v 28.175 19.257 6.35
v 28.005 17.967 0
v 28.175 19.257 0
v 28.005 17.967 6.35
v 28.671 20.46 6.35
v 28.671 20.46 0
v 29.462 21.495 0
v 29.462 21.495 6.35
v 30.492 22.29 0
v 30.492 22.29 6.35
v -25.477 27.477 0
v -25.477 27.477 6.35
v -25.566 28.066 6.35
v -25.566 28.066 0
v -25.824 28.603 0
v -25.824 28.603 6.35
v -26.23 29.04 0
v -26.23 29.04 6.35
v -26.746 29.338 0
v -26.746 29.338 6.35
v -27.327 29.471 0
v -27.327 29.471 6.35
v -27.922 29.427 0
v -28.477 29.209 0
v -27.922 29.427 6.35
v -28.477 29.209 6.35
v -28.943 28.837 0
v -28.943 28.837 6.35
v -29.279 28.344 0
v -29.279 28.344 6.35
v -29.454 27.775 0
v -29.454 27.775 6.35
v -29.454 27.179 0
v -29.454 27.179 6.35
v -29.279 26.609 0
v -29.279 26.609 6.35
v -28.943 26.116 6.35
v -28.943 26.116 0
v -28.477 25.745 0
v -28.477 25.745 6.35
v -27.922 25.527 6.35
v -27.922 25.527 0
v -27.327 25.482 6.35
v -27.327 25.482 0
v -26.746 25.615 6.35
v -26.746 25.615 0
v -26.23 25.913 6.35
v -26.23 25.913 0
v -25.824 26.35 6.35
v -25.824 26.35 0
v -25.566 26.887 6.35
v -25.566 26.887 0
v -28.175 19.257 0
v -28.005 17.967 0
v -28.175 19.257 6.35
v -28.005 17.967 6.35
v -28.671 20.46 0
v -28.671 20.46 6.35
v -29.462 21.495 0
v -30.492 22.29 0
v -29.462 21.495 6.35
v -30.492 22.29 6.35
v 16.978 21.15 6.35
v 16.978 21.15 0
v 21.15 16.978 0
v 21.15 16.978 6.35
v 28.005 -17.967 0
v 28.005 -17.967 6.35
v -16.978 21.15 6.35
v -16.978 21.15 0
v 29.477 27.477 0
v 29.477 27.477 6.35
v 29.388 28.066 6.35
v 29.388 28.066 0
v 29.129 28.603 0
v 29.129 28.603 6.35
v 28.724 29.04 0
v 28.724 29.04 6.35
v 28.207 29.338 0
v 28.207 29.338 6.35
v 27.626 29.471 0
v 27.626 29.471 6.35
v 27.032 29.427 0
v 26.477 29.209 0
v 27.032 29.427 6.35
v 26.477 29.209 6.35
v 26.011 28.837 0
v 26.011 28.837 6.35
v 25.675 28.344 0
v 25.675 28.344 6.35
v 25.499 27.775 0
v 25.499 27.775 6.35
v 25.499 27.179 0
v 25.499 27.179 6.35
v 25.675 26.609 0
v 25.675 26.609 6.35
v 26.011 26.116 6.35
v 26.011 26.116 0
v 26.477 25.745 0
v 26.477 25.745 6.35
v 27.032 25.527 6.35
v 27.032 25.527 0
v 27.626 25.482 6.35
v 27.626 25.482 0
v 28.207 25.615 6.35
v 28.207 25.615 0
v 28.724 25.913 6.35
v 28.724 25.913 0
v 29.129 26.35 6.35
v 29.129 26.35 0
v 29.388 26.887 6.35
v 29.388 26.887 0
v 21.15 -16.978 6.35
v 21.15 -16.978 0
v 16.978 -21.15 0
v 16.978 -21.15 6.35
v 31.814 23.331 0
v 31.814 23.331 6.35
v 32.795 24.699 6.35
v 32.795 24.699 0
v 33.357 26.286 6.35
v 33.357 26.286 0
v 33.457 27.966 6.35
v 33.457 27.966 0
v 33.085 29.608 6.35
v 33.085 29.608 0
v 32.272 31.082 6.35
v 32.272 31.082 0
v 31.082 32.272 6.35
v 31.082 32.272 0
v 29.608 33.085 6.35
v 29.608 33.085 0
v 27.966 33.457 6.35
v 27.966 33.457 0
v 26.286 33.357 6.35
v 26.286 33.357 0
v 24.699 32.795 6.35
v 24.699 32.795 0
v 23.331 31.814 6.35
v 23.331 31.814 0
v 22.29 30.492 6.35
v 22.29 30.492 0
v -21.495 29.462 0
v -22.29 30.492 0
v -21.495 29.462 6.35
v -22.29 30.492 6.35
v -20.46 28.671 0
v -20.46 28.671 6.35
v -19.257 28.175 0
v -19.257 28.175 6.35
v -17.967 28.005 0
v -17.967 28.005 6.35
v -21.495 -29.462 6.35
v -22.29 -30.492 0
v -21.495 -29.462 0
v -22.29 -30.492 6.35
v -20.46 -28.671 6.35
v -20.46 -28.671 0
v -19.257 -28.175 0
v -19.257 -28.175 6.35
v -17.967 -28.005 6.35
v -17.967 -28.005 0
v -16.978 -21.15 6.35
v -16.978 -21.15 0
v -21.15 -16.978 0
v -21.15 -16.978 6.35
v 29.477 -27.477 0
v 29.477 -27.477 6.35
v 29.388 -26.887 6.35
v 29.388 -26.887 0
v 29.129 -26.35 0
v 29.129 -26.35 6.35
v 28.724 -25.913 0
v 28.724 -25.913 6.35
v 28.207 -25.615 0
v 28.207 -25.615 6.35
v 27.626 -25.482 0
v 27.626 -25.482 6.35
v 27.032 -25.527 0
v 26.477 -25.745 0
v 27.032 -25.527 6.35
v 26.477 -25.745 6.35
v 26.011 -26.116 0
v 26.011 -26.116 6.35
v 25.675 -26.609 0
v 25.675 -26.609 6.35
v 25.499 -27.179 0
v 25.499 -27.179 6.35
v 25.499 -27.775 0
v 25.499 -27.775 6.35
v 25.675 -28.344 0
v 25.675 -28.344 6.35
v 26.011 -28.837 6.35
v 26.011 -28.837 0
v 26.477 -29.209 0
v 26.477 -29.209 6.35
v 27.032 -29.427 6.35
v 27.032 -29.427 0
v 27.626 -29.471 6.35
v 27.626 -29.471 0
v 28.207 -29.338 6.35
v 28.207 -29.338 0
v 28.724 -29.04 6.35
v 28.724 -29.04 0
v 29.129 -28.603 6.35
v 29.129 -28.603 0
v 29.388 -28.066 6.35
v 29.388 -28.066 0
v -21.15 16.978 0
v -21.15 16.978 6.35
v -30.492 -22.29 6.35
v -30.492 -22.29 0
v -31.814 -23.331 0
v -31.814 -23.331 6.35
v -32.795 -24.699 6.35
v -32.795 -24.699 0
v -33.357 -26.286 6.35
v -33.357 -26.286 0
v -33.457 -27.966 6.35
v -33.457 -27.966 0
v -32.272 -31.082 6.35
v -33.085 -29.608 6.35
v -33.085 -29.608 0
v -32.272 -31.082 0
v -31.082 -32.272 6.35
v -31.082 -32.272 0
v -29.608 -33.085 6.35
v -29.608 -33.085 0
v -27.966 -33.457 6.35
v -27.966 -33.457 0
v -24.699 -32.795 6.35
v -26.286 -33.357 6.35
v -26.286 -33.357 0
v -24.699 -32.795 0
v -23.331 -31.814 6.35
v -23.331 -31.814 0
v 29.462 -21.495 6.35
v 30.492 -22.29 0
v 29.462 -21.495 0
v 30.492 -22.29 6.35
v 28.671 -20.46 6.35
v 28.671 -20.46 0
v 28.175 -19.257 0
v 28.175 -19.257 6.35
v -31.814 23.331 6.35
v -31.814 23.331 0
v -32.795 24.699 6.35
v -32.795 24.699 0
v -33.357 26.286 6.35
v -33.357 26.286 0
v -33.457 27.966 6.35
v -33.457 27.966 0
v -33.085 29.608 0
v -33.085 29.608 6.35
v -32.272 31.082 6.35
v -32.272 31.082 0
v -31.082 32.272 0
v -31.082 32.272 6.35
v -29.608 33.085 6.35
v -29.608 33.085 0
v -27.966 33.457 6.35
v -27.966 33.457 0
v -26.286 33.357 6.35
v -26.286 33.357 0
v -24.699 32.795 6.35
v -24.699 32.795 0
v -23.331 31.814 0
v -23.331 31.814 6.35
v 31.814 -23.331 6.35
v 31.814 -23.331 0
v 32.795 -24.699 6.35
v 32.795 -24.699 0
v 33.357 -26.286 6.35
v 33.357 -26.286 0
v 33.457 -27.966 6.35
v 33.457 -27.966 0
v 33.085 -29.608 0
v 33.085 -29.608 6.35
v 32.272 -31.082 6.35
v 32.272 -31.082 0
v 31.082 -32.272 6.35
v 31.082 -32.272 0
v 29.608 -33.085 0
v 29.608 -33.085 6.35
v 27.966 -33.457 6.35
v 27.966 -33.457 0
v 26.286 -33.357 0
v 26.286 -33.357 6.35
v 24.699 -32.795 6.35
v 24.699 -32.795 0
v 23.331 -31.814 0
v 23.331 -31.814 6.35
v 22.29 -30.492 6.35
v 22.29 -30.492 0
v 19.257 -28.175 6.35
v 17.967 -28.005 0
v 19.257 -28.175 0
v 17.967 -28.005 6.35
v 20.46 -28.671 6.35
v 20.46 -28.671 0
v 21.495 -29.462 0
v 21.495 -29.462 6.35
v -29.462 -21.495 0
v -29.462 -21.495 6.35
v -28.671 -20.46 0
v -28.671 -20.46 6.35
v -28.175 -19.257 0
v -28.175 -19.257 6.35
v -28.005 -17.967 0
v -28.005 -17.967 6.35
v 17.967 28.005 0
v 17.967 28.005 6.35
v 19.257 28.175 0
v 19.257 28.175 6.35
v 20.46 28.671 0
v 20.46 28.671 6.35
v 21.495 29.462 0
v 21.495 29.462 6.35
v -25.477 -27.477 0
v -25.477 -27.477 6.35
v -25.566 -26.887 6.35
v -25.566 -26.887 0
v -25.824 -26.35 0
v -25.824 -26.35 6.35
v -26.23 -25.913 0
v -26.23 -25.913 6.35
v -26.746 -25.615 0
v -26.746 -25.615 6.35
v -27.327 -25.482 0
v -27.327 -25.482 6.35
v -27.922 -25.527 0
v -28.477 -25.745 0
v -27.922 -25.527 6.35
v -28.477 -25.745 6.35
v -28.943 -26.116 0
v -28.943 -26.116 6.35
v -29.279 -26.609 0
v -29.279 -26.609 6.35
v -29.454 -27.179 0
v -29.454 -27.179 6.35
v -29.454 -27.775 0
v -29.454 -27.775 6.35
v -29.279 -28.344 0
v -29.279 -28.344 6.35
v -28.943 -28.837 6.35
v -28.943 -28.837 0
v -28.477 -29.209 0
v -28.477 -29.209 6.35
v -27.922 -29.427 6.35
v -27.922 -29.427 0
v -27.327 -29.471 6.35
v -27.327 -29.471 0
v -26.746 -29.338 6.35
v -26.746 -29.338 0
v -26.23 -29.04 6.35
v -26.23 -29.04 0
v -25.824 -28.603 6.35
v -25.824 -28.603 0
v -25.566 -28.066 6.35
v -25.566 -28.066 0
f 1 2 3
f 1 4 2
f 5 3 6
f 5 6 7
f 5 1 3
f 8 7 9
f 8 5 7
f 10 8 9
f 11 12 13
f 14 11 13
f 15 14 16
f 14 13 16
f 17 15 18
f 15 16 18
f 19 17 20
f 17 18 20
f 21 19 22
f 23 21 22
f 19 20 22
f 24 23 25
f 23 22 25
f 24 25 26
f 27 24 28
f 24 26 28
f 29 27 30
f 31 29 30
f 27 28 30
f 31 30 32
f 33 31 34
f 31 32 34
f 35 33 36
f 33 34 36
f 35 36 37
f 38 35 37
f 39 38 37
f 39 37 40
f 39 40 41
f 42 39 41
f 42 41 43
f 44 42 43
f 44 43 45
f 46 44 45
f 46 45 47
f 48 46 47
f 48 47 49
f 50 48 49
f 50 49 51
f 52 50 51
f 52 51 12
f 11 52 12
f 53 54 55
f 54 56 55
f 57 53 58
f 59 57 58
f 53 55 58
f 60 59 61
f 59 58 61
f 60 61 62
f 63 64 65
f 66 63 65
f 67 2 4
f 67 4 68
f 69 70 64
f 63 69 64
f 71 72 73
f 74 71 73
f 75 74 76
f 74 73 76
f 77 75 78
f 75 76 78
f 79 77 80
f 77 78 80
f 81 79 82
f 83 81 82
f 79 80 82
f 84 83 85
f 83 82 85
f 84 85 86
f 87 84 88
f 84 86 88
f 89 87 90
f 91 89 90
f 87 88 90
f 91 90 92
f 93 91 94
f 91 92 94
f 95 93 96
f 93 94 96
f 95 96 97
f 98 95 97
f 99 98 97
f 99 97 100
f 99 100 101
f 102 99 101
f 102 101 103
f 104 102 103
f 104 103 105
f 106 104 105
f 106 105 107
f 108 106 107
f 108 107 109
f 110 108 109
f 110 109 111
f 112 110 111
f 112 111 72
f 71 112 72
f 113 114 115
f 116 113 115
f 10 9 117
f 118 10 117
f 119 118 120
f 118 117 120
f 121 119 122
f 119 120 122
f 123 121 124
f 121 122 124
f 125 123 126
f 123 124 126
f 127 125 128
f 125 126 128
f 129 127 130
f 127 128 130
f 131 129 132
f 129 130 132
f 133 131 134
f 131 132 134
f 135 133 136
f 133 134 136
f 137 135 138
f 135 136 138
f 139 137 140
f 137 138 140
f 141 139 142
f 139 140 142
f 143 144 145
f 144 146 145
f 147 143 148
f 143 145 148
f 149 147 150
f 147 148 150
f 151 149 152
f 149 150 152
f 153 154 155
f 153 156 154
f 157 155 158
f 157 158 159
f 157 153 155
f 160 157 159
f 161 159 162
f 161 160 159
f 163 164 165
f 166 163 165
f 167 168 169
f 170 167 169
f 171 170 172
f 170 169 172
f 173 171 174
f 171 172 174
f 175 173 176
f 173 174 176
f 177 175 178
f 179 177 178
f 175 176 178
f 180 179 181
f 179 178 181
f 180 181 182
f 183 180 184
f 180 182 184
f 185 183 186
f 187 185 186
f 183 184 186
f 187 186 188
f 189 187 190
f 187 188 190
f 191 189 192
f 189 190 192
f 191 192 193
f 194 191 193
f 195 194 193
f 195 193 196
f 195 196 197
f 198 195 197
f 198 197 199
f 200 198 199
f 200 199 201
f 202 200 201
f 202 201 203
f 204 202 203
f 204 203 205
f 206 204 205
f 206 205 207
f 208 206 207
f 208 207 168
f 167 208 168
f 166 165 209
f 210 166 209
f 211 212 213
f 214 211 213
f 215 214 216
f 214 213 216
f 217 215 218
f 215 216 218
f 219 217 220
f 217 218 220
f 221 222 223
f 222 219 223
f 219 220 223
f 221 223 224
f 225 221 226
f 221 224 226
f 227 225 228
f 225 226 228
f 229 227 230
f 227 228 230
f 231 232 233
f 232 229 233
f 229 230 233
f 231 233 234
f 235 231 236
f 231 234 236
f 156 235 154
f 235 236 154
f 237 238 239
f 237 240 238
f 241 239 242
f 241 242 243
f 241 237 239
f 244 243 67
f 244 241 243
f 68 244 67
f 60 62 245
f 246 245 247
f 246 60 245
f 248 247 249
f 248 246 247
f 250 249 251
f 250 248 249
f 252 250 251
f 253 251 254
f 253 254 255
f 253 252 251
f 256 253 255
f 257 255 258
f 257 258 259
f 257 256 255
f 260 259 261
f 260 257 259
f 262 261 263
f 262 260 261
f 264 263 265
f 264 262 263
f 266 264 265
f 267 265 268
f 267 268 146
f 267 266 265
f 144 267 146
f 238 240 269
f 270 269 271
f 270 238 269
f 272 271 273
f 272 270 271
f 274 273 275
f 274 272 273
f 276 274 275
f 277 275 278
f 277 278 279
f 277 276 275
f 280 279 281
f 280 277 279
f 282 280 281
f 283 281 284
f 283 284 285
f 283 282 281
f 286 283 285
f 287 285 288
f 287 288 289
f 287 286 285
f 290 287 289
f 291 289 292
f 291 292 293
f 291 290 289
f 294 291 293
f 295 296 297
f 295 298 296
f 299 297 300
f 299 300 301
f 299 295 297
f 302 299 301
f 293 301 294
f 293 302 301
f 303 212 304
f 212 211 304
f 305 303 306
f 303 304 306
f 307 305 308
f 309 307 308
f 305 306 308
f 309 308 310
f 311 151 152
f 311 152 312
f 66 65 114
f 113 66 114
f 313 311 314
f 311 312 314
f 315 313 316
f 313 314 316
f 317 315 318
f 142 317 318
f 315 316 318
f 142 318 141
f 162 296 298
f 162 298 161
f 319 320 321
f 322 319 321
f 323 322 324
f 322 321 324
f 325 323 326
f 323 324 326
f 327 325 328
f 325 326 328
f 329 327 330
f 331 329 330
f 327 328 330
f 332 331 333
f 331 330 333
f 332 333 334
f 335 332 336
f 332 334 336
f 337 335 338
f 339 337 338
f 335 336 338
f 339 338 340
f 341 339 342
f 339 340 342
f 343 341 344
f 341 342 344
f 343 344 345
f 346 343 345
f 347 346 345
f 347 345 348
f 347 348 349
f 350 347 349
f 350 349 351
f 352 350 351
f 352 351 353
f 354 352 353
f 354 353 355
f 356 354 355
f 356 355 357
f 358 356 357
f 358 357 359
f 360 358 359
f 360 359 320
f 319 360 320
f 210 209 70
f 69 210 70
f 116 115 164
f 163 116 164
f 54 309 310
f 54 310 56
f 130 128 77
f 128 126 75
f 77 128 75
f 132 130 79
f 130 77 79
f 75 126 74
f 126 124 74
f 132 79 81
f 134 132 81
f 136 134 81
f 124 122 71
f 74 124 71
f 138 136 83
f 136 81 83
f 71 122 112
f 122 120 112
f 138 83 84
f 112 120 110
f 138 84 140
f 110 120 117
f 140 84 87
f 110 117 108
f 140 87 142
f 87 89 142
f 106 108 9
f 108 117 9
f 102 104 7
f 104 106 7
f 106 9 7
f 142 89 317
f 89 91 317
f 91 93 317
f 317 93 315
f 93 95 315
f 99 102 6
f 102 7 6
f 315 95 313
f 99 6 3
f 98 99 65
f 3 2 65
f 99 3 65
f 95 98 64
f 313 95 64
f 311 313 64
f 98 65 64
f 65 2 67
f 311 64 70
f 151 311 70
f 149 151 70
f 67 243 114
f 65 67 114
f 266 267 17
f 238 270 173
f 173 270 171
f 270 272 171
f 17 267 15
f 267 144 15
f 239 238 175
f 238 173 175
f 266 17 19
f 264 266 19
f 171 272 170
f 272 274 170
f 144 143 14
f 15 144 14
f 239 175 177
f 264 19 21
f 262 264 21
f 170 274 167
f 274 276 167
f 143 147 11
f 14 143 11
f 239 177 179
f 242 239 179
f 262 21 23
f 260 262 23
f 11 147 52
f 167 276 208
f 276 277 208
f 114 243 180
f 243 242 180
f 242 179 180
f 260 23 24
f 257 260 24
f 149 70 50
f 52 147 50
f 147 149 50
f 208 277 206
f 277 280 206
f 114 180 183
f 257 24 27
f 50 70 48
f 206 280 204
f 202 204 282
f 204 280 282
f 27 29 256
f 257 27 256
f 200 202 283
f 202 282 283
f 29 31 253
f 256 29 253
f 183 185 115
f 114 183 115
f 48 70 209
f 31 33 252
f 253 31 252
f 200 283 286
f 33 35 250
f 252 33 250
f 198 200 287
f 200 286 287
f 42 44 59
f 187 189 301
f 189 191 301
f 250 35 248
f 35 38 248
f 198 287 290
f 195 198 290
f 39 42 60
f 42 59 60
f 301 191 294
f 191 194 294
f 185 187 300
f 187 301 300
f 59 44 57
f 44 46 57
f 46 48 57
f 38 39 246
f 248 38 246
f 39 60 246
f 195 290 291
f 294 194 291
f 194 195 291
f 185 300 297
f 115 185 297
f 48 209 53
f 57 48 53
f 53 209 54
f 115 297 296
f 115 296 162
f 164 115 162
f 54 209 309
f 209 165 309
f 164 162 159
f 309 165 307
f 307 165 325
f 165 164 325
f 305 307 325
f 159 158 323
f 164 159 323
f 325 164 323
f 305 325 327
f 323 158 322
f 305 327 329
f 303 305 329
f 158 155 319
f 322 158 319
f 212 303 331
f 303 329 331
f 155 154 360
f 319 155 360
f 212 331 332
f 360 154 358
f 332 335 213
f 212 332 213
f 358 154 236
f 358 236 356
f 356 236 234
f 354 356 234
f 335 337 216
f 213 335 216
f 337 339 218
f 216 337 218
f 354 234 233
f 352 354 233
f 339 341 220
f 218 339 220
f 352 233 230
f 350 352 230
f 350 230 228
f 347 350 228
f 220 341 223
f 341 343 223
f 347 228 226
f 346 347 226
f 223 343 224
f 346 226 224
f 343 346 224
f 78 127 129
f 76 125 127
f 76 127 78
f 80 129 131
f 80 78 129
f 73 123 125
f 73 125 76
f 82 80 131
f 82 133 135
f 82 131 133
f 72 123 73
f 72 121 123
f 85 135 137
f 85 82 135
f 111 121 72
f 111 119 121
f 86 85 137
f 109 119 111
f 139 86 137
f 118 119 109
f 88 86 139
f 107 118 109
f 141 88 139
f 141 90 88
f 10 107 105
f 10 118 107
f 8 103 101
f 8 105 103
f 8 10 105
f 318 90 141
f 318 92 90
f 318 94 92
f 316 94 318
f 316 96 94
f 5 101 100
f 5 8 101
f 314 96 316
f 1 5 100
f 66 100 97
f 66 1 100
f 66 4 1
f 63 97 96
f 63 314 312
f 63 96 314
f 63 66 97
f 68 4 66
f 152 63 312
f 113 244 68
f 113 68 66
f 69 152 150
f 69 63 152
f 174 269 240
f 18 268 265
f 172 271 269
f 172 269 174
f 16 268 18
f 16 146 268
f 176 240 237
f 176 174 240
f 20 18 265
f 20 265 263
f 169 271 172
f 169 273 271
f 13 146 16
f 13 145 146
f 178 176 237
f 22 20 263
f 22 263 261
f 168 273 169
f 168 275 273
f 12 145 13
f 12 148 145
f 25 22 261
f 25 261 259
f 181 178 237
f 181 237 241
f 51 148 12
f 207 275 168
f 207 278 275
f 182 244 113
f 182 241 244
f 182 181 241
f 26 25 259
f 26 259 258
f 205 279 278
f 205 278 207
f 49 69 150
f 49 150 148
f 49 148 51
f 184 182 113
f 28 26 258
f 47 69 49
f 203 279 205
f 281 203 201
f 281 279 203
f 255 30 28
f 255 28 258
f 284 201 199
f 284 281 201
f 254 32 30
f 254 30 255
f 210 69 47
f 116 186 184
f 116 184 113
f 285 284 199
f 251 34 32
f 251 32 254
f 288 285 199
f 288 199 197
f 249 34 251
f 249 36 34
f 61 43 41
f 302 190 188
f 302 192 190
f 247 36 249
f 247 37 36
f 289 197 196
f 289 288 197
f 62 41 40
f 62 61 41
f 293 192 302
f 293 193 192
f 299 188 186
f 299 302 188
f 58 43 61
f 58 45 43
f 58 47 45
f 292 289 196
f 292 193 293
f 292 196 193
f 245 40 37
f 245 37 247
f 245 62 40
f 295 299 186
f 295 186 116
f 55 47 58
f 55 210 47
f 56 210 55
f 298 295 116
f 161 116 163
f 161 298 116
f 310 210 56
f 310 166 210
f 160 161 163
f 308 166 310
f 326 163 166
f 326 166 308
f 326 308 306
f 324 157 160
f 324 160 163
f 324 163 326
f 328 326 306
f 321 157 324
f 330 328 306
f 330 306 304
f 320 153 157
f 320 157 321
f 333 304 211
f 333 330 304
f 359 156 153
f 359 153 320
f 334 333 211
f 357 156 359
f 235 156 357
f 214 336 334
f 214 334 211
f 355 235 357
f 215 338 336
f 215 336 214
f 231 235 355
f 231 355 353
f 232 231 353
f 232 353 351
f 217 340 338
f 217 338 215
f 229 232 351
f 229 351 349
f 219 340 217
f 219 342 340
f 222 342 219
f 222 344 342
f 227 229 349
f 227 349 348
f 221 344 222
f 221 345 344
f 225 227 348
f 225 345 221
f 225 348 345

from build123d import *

# Parameters (mm, degrees)
BOSS_EXTRU_2_DEPTH        = 6.35
ESQUISSE29_R              = 6
BOSS_EXTRU_3_DEPTH        = 6.35
SYM_TRIE2_COPY_1_SKETCH_R = 6
SYM_TRIE2_COPY_1_DEPTH    = 6.35
ESQUISSE30_R              = 2
ENL_V_MAT_EXTRU_1_DEPTH   = 48.7671004
CONG_1_R                  = 5


with BuildPart() as part:
    # Esquisse28 → Boss.-Extru.2 (new body)
    with BuildSketch(Plane.XY):
        Polygon((-21.5, -28.005382387), (-28.005382387, -21.5), (-28.005382387, 21.5), (-21.5, 28.005382387), (21.5, 28.005382387), (28.005382387, 21.5), (28.005382387, -21.5), (21.5, -28.005382387), align=None)
        Polygon((-16.978069991, -21.15), (-21.15, -16.978069991), (-21.15, 16.978069991), (-16.978069991, 21.15), (16.978069991, 21.15), (21.15, 16.978069991), (21.15, -16.978069991), (16.978069991, -21.15), align=None, mode=Mode.SUBTRACT)
    extrude(amount=BOSS_EXTRU_2_DEPTH)

    # Esquisse29 → Boss.-Extru.3 (add)
    with BuildSketch(Plane.XY):
        with Locations((27.476658888, 27.476658888)):
            Circle(ESQUISSE29_R)
    boss_extru_3 = extrude(amount=BOSS_EXTRU_3_DEPTH)

    # Symétrie1: Boss.-Extru.3 across plane
    add(boss_extru_3.mirror(Plane(origin=(0, 0, 0), x_dir=(0, 0, 1), z_dir=(1, 0, 0))))

    # Symétrie2: Boss.-Extru.3 across plane
    add(boss_extru_3.mirror(Plane.ZX))

    # Symétrie2 copy 1 sketch → Symétrie2 copy 1 (add)
    with BuildSketch(Plane(origin=(0, 0, 0), x_dir=(-1, 0, 0), z_dir=(0, 0, 1))):
        with Locations((27.476658888, 27.476658888)):
            Circle(SYM_TRIE2_COPY_1_SKETCH_R)
    extrude(amount=SYM_TRIE2_COPY_1_DEPTH)

    # Esquisse30 → Enlèv. mat.-Extru.1 (cut, through all)
    with BuildSketch(Plane.XY.offset(6.35)):
        with Locations((-27.476658888, 27.476658888)):
            Circle(ESQUISSE30_R)
        with Locations((27.476658888, 27.476658888)):
            Circle(ESQUISSE30_R)
        with Locations((27.476658888, -27.476658888)):
            Circle(ESQUISSE30_R)
        with Locations((-27.476658888, -27.476658888)):
            Circle(ESQUISSE30_R)
    extrude(amount=-ENL_V_MAT_EXTRU_1_DEPTH, mode=Mode.SUBTRACT)

    # Congé1
    cong_1_edges = [part.edges().sort_by_distance(p)[0] for p in [
        (-21.5, -28.005382387, 3.175),
        (-28.005382387, -21.5, 3.175),
        (-28.005382387, 21.5, 3.175),
        (-21.5, 28.005382387, 3.175),
        (21.5, 28.005382387, 3.175),
        (28.005382387, 21.5, 3.175),
        (28.005382387, -21.5, 3.175),
        (21.5, -28.005382387, 3.175),
    ]]
    fillet(cong_1_edges, radius=CONG_1_R)


solid = part.part
